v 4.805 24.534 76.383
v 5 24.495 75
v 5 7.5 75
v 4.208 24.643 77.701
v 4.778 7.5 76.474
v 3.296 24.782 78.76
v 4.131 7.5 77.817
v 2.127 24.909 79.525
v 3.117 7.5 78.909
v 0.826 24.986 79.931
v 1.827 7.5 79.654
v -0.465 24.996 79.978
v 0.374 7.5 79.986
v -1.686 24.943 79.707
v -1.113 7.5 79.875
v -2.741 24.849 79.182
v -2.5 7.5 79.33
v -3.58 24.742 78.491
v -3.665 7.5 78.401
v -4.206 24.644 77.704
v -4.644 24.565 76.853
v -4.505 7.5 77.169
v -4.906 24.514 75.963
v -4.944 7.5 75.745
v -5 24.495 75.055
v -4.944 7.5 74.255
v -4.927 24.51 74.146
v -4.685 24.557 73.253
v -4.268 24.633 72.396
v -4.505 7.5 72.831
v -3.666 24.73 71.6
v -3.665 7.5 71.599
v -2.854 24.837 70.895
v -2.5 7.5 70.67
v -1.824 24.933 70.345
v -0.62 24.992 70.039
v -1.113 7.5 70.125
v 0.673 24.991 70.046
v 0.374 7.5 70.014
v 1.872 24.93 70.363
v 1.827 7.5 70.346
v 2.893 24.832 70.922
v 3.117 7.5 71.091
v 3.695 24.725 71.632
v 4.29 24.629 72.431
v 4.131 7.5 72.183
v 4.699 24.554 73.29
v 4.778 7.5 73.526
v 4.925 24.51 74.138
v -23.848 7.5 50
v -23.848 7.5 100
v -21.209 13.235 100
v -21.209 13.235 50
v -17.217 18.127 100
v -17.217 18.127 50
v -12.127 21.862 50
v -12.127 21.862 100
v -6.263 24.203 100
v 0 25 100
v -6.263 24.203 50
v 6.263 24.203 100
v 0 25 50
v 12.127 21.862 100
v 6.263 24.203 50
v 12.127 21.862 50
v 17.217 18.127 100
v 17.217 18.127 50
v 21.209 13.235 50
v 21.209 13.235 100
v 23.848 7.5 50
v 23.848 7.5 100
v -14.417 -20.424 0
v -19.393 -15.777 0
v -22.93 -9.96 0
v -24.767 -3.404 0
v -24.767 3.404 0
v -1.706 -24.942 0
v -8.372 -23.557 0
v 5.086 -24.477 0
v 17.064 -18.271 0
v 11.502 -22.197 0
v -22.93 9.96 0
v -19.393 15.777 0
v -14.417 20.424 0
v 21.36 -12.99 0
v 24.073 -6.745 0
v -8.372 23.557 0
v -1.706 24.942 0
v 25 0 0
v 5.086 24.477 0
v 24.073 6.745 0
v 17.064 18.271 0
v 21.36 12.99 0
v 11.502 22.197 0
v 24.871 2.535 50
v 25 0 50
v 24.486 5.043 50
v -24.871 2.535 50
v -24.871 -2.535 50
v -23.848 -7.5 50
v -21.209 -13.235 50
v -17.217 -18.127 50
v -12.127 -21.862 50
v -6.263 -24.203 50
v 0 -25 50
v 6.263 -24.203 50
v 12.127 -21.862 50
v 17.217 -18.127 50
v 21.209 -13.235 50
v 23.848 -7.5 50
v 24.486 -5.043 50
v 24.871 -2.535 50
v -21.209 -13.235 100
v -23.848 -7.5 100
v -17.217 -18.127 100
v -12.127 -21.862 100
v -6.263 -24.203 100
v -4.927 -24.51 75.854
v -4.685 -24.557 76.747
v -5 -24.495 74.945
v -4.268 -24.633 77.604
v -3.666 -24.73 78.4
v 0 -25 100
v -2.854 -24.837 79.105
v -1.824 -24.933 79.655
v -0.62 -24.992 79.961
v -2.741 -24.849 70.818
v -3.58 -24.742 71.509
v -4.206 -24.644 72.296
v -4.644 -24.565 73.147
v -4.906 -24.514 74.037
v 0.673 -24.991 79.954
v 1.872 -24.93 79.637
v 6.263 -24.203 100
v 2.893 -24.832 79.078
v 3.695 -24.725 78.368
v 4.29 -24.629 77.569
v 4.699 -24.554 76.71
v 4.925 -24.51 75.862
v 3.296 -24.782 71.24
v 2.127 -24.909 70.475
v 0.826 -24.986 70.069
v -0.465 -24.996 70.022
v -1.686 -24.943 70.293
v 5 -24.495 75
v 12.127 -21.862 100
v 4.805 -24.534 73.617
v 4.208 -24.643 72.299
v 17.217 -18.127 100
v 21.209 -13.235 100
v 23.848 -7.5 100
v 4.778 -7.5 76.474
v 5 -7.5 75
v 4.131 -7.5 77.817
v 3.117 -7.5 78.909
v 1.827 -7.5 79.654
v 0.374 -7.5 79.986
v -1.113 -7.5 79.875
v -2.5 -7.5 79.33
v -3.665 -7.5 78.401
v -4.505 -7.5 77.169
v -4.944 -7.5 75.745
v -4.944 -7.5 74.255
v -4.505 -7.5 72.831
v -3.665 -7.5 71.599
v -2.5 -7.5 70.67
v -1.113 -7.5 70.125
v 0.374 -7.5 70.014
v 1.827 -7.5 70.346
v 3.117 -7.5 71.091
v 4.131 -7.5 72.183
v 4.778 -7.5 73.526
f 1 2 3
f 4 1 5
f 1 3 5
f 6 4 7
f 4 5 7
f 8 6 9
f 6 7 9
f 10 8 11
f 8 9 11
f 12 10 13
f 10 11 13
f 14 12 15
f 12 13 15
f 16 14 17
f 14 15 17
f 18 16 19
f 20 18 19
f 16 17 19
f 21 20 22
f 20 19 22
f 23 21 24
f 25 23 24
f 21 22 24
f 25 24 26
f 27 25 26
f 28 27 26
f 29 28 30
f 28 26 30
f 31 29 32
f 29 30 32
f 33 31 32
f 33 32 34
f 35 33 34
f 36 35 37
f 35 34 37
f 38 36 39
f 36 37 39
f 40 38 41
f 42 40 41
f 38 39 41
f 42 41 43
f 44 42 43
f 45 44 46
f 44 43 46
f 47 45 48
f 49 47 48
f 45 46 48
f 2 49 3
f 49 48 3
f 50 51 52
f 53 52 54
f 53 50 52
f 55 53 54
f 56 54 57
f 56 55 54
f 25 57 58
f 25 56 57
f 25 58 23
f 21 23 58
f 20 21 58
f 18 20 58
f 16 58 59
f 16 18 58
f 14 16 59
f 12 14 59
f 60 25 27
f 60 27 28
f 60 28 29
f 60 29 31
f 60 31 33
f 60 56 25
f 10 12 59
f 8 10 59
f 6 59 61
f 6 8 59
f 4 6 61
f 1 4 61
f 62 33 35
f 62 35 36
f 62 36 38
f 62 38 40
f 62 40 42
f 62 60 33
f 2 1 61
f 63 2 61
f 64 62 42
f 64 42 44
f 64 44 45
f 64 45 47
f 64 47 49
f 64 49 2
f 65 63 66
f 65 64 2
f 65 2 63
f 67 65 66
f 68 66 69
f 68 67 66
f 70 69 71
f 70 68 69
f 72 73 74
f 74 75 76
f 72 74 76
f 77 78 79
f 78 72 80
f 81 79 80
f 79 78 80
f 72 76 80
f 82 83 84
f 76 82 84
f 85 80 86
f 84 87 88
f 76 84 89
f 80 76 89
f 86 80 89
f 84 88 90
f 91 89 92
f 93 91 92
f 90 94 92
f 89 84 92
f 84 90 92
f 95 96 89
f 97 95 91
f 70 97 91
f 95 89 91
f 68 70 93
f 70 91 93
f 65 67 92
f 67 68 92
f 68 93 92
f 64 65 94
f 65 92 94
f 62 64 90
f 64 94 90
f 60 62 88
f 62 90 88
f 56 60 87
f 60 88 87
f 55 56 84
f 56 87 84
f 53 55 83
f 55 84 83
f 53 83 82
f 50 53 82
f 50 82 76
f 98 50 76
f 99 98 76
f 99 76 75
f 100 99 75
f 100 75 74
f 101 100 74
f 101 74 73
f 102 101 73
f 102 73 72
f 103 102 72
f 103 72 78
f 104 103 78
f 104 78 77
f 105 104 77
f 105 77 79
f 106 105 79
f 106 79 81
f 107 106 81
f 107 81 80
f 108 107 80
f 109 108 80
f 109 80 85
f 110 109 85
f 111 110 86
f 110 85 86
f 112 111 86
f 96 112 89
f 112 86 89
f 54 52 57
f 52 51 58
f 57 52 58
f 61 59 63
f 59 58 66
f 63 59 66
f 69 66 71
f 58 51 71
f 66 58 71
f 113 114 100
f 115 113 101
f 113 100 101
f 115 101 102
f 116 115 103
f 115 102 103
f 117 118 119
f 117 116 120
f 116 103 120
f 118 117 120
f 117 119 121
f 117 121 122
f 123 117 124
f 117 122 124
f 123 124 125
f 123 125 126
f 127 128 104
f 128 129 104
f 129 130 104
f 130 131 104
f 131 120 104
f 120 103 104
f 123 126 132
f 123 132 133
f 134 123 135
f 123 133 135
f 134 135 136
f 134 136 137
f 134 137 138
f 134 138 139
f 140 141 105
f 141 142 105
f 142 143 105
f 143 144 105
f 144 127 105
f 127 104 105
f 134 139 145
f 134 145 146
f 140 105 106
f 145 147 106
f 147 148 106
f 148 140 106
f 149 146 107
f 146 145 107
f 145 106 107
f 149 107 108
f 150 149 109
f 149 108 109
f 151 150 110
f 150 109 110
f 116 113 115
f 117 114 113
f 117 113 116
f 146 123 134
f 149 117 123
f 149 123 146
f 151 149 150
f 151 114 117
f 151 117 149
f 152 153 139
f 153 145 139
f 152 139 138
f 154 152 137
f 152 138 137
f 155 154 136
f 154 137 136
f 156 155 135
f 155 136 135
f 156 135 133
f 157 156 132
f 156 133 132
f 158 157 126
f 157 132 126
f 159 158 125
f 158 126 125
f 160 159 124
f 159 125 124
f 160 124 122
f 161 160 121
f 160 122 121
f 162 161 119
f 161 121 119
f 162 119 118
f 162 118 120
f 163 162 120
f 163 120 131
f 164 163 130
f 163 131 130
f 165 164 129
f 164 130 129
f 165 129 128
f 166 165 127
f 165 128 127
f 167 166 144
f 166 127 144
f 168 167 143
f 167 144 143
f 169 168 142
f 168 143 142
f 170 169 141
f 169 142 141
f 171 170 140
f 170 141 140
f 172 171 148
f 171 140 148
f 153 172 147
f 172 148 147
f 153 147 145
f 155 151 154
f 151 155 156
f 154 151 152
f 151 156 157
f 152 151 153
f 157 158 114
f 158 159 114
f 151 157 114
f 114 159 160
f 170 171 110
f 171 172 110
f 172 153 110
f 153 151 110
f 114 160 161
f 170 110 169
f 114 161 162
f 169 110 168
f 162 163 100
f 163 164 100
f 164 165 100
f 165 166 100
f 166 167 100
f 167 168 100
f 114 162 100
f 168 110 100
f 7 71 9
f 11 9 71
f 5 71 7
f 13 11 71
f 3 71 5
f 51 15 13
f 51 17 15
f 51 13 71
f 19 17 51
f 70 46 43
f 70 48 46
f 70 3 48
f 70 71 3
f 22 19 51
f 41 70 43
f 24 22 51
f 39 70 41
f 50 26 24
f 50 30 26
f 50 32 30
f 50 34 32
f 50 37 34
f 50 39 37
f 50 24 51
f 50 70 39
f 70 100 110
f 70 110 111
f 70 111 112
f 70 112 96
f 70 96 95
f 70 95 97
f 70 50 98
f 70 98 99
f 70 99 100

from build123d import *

# Parameters (mm, degrees)
F0_R     = 25
F1_DEPTH = 50
F3_DEPTH = 50
F5_R     = 5
F6_DEPTH = 25


# Not quite as in the source:
# - after a boolean that leaves OpenCascade's solid faulty, fix() repairs it


with BuildPart() as f1:
    # F0 (on Top) → F1 (new body)
    with BuildSketch(Plane.XY):
        Circle(F0_R)
    extrude(amount=F1_DEPTH)

    # F2 (on face) → F3 (join)
    with BuildSketch(Plane.XY.offset(50)):
        with BuildLine():
            Line((23.8484800354, -7.5), (-23.8484800354, -7.5))
            ThreePointArc((-23.8484800354, -7.5), (0, -25), (23.8484800354, -7.5))
        make_face()
    extrude(amount=F3_DEPTH)

    # F4: F1 across plane


with BuildPart() as f1_1:
    add(f1.part)
    add(f1.part.mirror(Plane.XZ))

    add(f1_1.part.fix(), mode=Mode.REPLACE)

    # F5 (on Front) → F6 (cut, symmetric)
    with BuildSketch(Plane.XZ):
        with Locations((0, 75)):
            Circle(F5_R)
    extrude(amount=F6_DEPTH, both=True, mode=Mode.SUBTRACT)


solid = f1_1.part
